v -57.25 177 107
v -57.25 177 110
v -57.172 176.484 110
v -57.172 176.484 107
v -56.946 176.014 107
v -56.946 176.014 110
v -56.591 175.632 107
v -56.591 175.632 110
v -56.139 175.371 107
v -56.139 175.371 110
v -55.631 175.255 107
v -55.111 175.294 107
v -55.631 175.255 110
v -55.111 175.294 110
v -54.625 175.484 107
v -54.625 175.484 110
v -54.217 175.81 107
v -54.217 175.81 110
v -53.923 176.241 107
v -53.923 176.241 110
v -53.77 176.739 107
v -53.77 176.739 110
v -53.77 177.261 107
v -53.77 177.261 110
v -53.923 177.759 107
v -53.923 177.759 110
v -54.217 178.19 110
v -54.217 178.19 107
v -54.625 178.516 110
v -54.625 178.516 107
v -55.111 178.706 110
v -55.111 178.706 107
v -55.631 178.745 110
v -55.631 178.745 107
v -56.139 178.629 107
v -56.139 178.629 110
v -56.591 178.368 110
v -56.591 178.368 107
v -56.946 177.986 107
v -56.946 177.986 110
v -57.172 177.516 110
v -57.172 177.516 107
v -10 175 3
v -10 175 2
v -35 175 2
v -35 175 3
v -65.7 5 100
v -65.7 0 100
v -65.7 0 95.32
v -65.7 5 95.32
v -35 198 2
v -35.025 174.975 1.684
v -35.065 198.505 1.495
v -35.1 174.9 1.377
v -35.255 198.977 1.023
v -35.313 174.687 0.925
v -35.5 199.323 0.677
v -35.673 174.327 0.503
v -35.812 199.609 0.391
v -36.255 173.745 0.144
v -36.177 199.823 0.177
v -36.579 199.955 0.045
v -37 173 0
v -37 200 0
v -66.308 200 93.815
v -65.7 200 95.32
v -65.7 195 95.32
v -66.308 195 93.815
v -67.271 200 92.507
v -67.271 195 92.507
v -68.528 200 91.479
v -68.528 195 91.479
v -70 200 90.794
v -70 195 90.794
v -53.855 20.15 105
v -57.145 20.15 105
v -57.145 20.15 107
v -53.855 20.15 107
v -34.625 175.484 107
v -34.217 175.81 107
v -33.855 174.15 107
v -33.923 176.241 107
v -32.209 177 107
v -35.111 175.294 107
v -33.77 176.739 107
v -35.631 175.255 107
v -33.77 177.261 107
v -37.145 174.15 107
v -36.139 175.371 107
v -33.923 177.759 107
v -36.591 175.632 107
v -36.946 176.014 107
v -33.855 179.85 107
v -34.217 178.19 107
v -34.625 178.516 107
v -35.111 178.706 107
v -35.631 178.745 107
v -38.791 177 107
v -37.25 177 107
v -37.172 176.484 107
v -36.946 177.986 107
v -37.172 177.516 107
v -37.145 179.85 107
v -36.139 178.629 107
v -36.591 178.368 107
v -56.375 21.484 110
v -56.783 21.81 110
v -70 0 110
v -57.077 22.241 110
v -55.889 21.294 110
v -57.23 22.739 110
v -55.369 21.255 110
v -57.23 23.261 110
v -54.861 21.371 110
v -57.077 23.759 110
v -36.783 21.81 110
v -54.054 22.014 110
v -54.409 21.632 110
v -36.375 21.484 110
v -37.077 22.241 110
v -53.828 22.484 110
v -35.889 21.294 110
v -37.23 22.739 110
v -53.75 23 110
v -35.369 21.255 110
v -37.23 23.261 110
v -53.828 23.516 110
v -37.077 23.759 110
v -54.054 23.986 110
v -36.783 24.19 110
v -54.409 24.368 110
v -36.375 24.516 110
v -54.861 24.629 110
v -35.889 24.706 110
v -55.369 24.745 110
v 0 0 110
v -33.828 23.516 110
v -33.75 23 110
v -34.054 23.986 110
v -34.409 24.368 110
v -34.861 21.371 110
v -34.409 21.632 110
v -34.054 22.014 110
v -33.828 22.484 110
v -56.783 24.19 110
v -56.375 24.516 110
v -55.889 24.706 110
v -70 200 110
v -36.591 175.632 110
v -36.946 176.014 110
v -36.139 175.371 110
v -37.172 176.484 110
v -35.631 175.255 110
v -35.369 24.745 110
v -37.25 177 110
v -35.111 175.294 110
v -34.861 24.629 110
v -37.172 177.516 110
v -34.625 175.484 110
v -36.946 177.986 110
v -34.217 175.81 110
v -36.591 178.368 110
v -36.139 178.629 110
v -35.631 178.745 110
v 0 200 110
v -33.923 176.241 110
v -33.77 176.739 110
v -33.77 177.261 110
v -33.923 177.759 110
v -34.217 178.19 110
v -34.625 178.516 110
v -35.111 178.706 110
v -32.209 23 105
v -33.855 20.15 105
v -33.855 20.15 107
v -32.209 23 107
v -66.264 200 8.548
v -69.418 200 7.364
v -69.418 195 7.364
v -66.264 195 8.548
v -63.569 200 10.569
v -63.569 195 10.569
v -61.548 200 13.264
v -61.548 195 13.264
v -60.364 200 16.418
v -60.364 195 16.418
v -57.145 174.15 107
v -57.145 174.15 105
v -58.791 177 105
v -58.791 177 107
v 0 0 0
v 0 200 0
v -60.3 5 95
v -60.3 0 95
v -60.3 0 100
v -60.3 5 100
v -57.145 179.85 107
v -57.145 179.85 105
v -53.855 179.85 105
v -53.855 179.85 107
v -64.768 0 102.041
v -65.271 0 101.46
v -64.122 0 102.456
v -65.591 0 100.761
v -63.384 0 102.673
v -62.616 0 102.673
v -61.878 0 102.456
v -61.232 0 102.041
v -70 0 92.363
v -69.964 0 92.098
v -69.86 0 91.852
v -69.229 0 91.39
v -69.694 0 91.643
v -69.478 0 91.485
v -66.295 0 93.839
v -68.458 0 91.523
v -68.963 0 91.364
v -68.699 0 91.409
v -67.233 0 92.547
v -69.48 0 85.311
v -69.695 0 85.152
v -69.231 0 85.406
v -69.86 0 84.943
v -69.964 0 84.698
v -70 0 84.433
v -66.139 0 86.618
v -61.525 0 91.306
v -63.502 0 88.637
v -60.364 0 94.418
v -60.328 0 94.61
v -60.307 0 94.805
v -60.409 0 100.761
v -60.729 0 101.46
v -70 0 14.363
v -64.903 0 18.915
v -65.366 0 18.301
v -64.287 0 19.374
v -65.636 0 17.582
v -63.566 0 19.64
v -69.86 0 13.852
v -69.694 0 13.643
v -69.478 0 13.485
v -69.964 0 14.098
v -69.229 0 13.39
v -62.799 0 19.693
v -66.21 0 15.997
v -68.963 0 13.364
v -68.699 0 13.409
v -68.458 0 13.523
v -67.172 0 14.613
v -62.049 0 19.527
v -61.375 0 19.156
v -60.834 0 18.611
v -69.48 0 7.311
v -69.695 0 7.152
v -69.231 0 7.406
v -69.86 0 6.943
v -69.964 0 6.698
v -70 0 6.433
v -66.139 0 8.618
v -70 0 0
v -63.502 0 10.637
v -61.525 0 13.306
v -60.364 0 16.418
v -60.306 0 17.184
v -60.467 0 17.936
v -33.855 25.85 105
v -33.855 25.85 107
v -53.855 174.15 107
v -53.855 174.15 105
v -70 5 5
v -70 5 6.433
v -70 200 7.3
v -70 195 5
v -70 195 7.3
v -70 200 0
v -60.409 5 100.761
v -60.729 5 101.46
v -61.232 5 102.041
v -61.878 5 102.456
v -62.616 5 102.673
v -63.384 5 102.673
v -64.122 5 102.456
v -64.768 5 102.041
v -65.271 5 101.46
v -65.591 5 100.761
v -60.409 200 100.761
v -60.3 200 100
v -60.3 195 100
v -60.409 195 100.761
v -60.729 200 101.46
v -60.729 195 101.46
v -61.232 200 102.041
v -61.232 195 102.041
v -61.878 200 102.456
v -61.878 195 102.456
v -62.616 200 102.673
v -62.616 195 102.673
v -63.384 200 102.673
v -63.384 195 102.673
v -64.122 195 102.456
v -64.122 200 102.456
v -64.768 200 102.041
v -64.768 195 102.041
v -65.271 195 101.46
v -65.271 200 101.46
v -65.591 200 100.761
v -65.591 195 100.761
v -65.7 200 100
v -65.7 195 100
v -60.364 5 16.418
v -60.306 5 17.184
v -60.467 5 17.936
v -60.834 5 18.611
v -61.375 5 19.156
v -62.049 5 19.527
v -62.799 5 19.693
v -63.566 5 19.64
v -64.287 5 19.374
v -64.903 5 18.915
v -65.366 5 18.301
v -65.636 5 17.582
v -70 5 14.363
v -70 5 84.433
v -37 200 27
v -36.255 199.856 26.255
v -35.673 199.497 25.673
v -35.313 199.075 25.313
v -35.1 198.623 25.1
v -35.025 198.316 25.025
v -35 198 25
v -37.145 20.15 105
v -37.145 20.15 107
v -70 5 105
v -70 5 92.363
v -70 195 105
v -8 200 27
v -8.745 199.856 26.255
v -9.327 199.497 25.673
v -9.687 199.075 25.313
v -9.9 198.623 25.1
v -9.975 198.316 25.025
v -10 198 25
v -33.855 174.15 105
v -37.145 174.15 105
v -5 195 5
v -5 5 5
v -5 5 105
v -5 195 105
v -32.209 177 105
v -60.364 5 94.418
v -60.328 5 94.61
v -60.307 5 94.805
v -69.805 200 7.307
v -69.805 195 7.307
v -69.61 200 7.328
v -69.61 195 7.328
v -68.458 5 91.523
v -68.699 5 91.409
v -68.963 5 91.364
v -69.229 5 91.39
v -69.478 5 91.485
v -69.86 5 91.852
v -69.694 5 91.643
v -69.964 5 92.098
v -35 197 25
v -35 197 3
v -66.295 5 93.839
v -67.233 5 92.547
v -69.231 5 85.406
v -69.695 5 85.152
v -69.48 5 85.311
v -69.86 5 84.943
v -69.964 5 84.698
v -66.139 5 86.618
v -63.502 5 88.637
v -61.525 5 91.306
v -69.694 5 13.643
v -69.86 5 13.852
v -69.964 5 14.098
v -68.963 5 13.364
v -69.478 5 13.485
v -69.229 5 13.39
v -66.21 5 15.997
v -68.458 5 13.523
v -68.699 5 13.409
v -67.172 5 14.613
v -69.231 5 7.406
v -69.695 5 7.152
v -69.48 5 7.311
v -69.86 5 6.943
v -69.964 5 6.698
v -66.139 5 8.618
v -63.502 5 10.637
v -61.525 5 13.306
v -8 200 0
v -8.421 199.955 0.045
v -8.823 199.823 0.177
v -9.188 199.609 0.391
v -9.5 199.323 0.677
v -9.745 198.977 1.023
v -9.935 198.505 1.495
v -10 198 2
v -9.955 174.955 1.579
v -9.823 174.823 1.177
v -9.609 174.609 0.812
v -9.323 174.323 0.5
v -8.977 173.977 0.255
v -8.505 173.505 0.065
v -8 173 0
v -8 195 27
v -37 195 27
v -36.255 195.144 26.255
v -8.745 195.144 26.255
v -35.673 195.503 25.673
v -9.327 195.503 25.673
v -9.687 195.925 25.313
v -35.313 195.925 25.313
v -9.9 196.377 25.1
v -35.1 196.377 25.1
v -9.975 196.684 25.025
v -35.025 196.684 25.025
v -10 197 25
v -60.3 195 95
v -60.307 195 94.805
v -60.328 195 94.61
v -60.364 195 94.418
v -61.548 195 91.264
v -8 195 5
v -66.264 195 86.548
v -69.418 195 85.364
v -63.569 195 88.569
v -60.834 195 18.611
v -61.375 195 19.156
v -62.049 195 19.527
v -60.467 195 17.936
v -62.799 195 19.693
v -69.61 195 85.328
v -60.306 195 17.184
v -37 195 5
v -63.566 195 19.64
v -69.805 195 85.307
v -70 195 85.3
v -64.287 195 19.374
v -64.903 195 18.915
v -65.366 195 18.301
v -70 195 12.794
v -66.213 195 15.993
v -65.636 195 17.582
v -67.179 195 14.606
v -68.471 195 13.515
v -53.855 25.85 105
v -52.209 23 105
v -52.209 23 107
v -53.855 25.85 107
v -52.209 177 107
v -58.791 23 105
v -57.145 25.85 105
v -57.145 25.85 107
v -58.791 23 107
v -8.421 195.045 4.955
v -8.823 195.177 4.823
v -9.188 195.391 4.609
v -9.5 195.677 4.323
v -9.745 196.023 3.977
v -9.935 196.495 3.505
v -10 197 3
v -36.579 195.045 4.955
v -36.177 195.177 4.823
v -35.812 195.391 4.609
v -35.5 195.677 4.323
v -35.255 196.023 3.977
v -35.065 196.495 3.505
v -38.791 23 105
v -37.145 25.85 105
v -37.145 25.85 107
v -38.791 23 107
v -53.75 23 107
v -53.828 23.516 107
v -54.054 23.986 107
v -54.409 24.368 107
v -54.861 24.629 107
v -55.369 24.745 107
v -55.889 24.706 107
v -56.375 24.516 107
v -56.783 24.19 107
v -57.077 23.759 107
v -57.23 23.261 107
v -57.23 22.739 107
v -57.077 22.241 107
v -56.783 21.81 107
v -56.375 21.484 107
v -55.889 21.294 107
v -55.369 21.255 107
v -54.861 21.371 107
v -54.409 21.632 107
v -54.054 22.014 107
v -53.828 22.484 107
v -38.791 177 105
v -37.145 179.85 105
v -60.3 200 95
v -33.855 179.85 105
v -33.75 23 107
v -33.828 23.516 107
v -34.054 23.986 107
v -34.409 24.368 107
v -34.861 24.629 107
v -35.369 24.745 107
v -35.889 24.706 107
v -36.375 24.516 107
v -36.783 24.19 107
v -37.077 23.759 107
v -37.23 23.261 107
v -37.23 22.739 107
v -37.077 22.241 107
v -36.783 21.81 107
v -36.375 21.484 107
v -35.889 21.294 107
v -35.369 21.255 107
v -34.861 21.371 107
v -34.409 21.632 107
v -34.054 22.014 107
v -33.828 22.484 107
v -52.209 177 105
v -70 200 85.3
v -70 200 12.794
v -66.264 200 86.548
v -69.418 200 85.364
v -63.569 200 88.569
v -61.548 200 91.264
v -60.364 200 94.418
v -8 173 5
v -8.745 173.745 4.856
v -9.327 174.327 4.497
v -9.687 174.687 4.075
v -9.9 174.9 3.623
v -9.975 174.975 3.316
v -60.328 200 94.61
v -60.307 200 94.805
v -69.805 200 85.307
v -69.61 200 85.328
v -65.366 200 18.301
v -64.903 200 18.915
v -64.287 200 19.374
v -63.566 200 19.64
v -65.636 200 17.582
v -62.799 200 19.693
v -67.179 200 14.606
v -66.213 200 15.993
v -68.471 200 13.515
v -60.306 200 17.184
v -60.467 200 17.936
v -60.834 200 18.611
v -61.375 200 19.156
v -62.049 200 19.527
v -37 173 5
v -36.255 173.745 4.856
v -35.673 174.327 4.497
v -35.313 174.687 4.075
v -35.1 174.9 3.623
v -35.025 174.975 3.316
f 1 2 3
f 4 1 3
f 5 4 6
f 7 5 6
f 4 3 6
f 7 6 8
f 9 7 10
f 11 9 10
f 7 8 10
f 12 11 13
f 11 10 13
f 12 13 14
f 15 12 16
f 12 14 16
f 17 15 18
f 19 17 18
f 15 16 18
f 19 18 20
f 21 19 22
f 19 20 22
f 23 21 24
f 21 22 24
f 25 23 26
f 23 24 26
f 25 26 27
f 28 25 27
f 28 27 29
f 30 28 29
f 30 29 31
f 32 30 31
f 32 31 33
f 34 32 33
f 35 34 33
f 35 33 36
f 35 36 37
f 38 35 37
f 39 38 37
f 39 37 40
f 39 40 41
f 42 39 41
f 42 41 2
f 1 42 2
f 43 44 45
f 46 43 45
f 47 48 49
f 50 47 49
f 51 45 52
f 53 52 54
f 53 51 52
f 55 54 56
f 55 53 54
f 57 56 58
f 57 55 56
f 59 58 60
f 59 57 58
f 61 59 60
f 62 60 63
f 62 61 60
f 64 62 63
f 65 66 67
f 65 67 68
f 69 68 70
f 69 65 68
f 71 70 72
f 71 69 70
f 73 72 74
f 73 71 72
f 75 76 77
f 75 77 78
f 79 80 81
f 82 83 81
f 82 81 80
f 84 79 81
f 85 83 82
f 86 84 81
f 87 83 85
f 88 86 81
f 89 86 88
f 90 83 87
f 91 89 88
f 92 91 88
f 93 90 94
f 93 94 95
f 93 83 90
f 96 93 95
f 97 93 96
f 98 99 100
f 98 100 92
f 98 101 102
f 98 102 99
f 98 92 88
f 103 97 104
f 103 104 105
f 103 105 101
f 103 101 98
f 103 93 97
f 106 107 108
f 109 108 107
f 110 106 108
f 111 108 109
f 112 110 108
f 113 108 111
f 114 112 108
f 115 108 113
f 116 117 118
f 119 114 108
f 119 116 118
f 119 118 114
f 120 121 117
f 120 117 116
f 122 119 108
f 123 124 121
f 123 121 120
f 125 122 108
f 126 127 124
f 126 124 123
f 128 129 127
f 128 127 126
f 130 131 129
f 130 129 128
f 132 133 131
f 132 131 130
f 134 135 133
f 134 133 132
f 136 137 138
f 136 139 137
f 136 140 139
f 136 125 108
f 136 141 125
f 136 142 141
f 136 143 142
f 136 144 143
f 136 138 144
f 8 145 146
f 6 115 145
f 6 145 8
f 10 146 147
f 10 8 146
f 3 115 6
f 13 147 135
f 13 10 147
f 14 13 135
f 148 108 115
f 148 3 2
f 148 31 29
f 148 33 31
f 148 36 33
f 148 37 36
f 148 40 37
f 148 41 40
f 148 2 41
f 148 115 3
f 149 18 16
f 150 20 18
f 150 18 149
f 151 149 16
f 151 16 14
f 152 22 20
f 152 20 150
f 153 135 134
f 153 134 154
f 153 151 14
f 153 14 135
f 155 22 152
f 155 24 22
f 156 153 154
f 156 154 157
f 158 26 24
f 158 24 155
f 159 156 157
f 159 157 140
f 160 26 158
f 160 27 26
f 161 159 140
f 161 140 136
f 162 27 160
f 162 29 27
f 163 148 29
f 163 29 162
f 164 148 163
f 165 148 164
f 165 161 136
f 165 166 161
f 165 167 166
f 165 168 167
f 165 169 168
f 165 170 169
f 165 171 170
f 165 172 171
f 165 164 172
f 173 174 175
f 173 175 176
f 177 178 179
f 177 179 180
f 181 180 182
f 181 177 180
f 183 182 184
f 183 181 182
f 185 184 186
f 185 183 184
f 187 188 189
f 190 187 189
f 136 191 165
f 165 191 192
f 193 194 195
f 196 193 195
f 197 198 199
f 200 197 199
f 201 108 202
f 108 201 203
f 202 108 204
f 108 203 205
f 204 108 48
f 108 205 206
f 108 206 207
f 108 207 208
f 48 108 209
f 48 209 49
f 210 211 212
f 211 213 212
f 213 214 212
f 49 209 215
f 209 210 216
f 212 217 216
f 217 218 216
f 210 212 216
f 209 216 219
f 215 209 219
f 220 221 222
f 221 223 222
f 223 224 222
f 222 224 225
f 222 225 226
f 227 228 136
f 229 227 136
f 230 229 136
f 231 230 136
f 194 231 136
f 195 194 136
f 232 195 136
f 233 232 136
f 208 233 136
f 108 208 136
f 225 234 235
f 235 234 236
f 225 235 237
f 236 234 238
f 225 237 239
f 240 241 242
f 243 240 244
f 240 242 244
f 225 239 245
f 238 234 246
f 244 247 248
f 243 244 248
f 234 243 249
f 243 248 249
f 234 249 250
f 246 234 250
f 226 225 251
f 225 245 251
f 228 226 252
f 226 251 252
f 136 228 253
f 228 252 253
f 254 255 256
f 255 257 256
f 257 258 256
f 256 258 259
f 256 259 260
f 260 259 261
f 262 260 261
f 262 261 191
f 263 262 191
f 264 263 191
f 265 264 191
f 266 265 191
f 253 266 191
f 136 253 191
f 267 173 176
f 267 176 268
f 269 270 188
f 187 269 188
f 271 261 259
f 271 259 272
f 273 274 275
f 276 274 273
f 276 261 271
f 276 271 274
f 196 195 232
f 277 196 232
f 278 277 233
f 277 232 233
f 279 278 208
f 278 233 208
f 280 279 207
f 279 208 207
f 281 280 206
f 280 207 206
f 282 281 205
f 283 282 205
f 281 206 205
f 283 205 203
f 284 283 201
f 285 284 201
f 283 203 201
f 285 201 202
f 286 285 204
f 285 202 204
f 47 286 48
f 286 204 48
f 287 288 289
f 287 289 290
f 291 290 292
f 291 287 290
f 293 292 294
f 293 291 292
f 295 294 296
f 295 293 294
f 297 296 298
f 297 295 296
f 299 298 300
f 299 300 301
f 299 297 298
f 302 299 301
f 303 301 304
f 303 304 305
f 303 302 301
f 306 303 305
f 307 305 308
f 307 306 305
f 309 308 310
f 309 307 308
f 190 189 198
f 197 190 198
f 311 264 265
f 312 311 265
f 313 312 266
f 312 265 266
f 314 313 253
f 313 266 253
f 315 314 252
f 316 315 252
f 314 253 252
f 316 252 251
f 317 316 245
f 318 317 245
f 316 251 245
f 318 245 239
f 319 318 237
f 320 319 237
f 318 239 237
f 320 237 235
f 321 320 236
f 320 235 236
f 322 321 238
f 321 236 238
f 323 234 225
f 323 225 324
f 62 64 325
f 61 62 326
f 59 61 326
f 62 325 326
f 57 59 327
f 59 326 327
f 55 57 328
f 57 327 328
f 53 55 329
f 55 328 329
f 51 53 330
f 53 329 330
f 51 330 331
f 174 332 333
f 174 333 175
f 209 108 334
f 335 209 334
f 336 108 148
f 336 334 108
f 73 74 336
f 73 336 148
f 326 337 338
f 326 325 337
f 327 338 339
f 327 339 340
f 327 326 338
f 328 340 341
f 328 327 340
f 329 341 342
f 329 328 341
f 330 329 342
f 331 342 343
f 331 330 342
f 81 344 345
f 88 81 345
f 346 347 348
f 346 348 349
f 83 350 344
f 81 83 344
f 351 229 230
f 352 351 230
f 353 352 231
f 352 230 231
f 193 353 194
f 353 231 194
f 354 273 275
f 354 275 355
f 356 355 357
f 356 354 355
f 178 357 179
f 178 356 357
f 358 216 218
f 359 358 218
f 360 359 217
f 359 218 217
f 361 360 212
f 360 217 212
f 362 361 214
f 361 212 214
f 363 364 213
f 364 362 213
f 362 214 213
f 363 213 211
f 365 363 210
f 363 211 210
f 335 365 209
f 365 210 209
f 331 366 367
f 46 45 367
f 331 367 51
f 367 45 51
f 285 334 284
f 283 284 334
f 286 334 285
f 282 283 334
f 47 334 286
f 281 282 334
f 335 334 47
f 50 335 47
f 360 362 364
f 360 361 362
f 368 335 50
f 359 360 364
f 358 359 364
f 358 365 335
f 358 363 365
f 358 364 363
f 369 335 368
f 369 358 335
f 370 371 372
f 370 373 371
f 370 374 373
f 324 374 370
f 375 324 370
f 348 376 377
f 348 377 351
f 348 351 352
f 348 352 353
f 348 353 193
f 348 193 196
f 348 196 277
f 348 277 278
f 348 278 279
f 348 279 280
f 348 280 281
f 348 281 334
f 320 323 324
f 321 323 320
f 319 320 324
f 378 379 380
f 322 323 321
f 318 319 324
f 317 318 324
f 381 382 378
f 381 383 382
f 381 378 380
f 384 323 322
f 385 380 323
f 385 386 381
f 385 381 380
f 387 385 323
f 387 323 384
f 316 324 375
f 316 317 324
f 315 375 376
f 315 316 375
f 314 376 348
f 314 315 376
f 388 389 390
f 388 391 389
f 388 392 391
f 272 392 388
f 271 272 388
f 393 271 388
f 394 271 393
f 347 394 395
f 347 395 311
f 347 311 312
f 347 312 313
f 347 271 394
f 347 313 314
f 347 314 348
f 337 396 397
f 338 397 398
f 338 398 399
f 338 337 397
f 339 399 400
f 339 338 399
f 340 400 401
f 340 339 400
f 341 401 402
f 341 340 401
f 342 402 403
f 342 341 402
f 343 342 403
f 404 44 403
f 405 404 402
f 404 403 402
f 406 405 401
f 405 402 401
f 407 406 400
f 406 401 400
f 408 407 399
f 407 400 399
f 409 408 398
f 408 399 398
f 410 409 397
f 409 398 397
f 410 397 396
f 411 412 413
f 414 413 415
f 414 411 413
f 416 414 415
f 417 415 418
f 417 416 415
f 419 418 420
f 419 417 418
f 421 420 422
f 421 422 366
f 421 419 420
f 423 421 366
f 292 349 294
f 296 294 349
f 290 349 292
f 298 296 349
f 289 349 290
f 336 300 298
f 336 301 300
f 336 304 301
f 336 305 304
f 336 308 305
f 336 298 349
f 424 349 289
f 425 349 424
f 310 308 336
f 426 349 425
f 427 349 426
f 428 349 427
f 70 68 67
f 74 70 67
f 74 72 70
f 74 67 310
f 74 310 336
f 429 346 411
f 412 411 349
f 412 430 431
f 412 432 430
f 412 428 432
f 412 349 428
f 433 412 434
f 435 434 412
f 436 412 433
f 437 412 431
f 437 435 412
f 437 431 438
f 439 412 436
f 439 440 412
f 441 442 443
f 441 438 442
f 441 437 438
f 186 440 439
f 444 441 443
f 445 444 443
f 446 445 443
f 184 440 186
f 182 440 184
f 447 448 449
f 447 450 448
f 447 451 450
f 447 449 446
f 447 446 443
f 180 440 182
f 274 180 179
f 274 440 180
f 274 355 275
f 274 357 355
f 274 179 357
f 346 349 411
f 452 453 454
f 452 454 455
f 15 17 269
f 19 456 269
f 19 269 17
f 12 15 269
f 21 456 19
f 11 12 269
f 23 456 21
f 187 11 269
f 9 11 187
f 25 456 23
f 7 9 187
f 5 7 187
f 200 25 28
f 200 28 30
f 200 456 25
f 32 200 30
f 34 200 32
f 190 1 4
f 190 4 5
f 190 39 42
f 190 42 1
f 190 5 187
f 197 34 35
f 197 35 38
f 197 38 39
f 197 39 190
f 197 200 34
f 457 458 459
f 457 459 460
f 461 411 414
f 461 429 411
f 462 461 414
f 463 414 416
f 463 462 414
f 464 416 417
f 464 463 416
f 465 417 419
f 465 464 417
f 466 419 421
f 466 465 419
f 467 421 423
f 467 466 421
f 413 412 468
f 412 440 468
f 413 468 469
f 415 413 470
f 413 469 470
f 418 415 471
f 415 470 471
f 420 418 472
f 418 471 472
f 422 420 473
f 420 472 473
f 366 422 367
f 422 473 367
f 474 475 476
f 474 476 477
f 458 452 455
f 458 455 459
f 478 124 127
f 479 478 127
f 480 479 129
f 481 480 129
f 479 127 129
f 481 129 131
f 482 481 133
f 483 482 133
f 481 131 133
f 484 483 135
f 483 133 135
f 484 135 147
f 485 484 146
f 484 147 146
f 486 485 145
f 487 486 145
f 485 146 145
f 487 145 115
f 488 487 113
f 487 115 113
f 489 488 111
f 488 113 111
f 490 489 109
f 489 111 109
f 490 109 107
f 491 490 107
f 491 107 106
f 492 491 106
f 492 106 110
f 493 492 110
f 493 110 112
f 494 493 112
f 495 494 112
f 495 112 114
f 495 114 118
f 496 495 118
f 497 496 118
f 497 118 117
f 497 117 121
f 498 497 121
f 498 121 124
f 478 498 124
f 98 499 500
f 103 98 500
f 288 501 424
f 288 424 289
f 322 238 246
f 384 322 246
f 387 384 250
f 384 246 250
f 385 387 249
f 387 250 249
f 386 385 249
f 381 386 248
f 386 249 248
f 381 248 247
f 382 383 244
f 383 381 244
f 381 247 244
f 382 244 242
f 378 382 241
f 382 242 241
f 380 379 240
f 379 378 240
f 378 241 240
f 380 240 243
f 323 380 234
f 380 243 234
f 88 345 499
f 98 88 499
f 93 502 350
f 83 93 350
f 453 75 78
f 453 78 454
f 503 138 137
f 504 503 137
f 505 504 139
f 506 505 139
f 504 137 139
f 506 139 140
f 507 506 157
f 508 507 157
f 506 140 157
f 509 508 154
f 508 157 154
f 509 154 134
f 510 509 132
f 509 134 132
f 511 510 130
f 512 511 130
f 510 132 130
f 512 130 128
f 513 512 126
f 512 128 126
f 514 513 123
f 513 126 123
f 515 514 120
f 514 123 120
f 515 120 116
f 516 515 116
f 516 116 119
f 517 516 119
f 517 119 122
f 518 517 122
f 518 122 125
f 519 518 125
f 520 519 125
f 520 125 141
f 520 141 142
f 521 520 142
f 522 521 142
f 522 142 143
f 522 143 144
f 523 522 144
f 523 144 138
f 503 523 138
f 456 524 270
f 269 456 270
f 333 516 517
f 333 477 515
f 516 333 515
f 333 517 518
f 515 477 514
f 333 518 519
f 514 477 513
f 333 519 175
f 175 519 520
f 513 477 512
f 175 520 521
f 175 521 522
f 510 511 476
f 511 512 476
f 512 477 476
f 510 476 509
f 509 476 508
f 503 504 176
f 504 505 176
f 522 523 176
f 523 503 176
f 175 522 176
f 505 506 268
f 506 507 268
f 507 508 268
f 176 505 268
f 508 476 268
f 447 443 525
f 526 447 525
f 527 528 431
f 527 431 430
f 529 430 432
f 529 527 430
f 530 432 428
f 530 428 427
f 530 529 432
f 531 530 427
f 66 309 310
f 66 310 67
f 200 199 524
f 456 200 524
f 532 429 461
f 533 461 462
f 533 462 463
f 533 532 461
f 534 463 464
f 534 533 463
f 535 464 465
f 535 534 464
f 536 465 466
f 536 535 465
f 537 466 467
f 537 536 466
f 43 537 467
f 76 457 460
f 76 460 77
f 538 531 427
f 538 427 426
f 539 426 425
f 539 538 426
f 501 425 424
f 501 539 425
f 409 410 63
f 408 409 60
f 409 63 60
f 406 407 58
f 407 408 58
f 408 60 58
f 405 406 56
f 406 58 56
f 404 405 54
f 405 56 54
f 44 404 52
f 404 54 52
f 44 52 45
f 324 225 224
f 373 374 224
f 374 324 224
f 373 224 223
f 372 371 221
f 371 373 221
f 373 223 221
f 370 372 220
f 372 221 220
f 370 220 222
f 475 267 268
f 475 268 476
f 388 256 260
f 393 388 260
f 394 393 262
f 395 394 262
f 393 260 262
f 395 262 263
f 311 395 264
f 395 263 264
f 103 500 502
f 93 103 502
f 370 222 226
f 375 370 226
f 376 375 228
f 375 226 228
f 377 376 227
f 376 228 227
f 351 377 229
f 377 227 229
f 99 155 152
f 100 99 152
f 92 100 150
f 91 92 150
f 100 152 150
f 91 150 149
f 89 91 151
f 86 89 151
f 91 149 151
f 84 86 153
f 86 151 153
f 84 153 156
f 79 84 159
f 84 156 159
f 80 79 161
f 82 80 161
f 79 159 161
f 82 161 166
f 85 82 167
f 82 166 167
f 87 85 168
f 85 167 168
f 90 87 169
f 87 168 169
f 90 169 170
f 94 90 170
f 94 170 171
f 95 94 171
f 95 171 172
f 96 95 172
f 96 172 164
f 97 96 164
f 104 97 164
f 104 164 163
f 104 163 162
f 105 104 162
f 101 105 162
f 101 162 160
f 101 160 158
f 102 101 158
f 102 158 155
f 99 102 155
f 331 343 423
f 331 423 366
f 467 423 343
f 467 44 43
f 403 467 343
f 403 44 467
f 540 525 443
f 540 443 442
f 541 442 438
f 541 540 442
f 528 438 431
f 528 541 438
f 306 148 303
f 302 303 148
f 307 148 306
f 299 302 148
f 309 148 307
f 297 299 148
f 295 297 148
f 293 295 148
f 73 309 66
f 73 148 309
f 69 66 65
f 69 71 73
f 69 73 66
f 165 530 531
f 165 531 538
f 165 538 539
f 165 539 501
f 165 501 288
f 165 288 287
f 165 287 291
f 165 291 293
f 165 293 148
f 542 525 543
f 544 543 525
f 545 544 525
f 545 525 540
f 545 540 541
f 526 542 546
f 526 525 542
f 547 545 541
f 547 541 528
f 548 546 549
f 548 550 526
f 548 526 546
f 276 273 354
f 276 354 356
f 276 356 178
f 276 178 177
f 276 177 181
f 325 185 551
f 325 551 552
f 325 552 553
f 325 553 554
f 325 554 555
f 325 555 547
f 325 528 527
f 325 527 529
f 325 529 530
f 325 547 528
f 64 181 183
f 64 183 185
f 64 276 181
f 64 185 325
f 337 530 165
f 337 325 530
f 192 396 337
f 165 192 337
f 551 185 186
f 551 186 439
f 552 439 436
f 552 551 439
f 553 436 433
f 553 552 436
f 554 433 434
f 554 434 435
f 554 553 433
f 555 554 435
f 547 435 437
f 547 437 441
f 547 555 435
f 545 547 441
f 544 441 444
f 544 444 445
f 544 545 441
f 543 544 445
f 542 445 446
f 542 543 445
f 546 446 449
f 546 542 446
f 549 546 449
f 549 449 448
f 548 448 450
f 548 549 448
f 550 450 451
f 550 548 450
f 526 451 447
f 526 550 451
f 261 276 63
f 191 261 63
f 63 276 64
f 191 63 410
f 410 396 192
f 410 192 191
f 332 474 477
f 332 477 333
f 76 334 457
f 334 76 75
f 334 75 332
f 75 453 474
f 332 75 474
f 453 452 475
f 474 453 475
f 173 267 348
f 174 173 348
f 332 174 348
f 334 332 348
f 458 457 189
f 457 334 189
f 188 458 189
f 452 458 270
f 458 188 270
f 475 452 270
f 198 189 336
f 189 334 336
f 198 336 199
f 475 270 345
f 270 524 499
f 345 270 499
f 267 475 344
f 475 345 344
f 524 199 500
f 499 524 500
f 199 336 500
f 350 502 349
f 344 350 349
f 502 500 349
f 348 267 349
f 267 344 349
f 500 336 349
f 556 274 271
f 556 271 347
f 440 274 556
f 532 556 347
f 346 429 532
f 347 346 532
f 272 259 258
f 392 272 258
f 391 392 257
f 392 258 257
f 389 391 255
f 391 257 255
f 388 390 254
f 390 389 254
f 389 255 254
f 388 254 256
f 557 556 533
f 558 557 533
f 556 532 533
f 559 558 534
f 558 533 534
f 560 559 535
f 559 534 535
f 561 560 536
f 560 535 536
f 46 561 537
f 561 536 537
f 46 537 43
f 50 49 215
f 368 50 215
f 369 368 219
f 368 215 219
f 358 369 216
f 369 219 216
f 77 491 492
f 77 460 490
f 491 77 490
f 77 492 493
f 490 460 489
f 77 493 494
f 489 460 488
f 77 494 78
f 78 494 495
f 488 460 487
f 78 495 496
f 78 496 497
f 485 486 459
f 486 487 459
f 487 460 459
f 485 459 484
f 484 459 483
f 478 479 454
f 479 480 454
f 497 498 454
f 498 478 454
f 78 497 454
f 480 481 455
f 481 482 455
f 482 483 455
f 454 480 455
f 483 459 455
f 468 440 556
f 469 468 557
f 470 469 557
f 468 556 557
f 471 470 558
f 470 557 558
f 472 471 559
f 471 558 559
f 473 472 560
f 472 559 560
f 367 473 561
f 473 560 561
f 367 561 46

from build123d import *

# Parameters (mm, degrees)
ESQUISSE1_W             = 70
ESQUISSE1_H             = 200
BOSS_EXTRU_1_DEPTH      = 5
BOSS_EXTRU_2_DEPTH      = 100
ESQUISSE3_W             = 70
ESQUISSE3_H             = 200
BOSS_EXTRU_3_DEPTH      = 5
ENL_V_MAT_EXTRU_2_DEPTH = 5
CONG_3_R                = 1
ESQUISSE7_R             = 1.75
ENL_V_MAT_EXTRU_4_DEPTH = 5
ENL_V_MAT_EXTRU_5_DEPTH = 2
ESQUISSE9_W             = 25
ESQUISSE9_H             = 25
ENL_V_MAT_EXTRU_6_DEPTH = 25
CONG_4_R                = 2


with BuildPart() as part:
    # Esquisse1 → Boss.-Extru.1 (new body)
    with BuildSketch(Plane.XY):
        with Locations((-35, 100)):
            Rectangle(ESQUISSE1_W, ESQUISSE1_H)
    extrude(amount=BOSS_EXTRU_1_DEPTH)

    # Esquisse2 → Boss.-Extru.2 (add)
    with BuildSketch(Plane.XY.offset(5)):
        Polygon((0, 0), (-70, 0), (-70, 5), (-5, 5), (-5, 195), (-70, 195), (-70, 200), (0, 200), align=None)
    extrude(amount=BOSS_EXTRU_2_DEPTH)

    # Esquisse3 → Boss.-Extru.3 (add)
    with BuildSketch(Plane.XY.offset(105)):
        with Locations((-35, 100)):
            Rectangle(ESQUISSE3_W, ESQUISSE3_H)
    extrude(amount=BOSS_EXTRU_3_DEPTH)

    # Esquisse5 → Enlèv. mat.-Extru.2 (cut)
    with BuildSketch(Plane.XZ):
        with BuildLine():
            ThreePointArc((-65.636494811, 17.582146985), (-67.179174329, 14.605555398), (-70, 12.793677891))
            Line((-70, 12.793677891), (-70, 7.3))
            ThreePointArc((-70, 7.3), (-69.707199718, 7.315923251), (-69.417853015, 7.363505189))
            ThreePointArc((-69.417853015, 7.363505189), (-63.569041252, 10.569041252), (-60.363505189, 16.417853015))
            ThreePointArc((-60.363505189, 16.417853015), (-62.417853015, 19.636494811), (-65.636494811, 17.582146985))
        make_face()
        with BuildLine():
            ThreePointArc((-60.363505189, 94.417853015), (-63.292800282, 92.315923251), (-65.7, 95))
            Line((-65.7, 95), (-65.7, 95.320415964))
            ThreePointArc((-65.7, 95.320415964), (-67.270907084, 92.506959978), (-70, 90.793677891))
            Line((-70, 90.793677891), (-70, 85.3))
            ThreePointArc((-70, 85.3), (-69.707199718, 85.315923251), (-69.417853015, 85.363505189))
            ThreePointArc((-69.417853015, 85.363505189), (-63.569041252, 88.569041252), (-60.363505189, 94.417853015))
        make_face()
        with BuildLine():
            Line((-65.7, 95.320415964), (-65.7, 95))
            ThreePointArc((-65.7, 95), (-63.292800282, 92.315923251), (-60.363505189, 94.417853015))
            ThreePointArc((-60.363505189, 94.417853015), (-60.315923251, 94.707199718), (-60.3, 95))
            ThreePointArc((-60.3, 95), (-62.707199718, 97.684076749), (-65.636494811, 95.582146985))
            ThreePointArc((-65.636494811, 95.582146985), (-65.666891669, 95.450952525), (-65.7, 95.320415964))
        make_face()
        with BuildLine():
            Line((-65.7, 100), (-65.7, 95.320415964))
            ThreePointArc((-65.7, 95.320415964), (-65.666891669, 95.450952525), (-65.636494811, 95.582146985))
            ThreePointArc((-65.636494811, 95.582146985), (-62.707199718, 97.684076749), (-60.3, 95))
            Line((-60.3, 95), (-60.3, 100))
            ThreePointArc((-60.3, 100), (-63, 102.7), (-65.7, 100))
        make_face()
    enl_v_mat_extru_2 = extrude(amount=-ENL_V_MAT_EXTRU_2_DEPTH, mode=Mode.SUBTRACT)

    # Symétrie1: Enlèv. mat.-Extru.2 across plane
    add(enl_v_mat_extru_2.mirror(Plane.ZX.offset(100)), mode=Mode.SUBTRACT)

    # Congé3
    cong_3_edges = [part.edges().sort_by_distance(p)[0] for p in [
        (-70, 2.5, 90.793677891),
        (-70, 2.5, 85.3),
        (-70, 2.5, 12.793677891),
        (-70, 2.5, 7.3),
    ]]
    fillet(cong_3_edges, radius=CONG_3_R)

    # Esquisse7 → Enlèv. mat.-Extru.4 (cut)
    with BuildSketch(Plane.XY.offset(110)):
        with Locations((-55.5, 23)):
            Circle(ESQUISSE7_R)
        with Locations((-35.5, 23)):
            Circle(ESQUISSE7_R)
        with Locations((-55.5, 177)):
            Circle(ESQUISSE7_R)
        with Locations((-35.5, 177)):
            Circle(ESQUISSE7_R)
    extrude(amount=-ENL_V_MAT_EXTRU_4_DEPTH, mode=Mode.SUBTRACT)

    # Esquisse8 → Enlèv. mat.-Extru.5 (cut)
    with BuildSketch(Plane(origin=(0, 0, 105), x_dir=(-1, 0, 0), z_dir=(0, 0, -1))):
        Polygon((33.854551733, 25.85), (37.145448267, 25.85), (38.790896534, 23), (37.145448267, 20.15), (33.854551733, 20.15), (32.209103466, 23), align=None)
        Polygon((53.854551733, 25.85), (57.145448267, 25.85), (58.790896534, 23), (57.145448267, 20.15), (53.854551733, 20.15), (52.209103466, 23), align=None)
        Polygon((52.209103466, 177), (53.854551733, 174.15), (57.145448267, 174.15), (58.790896534, 177), (57.145448267, 179.85), (53.854551733, 179.85), align=None)
        Polygon((32.209103466, 177), (33.854551733, 174.15), (37.145448267, 174.15), (38.790896534, 177), (37.145448267, 179.85), (33.854551733, 179.85), align=None)
    extrude(amount=-ENL_V_MAT_EXTRU_5_DEPTH, mode=Mode.SUBTRACT)

    # Esquisse9 → Enlèv. mat.-Extru.6 (cut)
    with BuildSketch(Plane(origin=(0, 0, 0), x_dir=(-1, 0, 0), z_dir=(0, 0, -1))):
        with Locations((22.5, 187.5)):
            Rectangle(ESQUISSE9_W, ESQUISSE9_H)
    extrude(amount=-ENL_V_MAT_EXTRU_6_DEPTH, mode=Mode.SUBTRACT)

    # Congé4
    cong_4_edges = [part.edges().sort_by_distance(p)[0] for p in [
        (-35, 185, 5),
        (-22.5, 175, 5),
        (-10, 185, 5),
        (-10, 195, 15),
        (-22.5, 200, 25),
        (-22.5, 195, 25),
        (-35, 200, 12.5),
        (-35, 195, 15),
        (-10, 200, 12.5),
        (-10, 187.5, 0),
        (-35, 187.5, 0),
        (-22.5, 175, 0),
    ]]
    fillet(cong_4_edges, radius=CONG_4_R)


solid = part.part
